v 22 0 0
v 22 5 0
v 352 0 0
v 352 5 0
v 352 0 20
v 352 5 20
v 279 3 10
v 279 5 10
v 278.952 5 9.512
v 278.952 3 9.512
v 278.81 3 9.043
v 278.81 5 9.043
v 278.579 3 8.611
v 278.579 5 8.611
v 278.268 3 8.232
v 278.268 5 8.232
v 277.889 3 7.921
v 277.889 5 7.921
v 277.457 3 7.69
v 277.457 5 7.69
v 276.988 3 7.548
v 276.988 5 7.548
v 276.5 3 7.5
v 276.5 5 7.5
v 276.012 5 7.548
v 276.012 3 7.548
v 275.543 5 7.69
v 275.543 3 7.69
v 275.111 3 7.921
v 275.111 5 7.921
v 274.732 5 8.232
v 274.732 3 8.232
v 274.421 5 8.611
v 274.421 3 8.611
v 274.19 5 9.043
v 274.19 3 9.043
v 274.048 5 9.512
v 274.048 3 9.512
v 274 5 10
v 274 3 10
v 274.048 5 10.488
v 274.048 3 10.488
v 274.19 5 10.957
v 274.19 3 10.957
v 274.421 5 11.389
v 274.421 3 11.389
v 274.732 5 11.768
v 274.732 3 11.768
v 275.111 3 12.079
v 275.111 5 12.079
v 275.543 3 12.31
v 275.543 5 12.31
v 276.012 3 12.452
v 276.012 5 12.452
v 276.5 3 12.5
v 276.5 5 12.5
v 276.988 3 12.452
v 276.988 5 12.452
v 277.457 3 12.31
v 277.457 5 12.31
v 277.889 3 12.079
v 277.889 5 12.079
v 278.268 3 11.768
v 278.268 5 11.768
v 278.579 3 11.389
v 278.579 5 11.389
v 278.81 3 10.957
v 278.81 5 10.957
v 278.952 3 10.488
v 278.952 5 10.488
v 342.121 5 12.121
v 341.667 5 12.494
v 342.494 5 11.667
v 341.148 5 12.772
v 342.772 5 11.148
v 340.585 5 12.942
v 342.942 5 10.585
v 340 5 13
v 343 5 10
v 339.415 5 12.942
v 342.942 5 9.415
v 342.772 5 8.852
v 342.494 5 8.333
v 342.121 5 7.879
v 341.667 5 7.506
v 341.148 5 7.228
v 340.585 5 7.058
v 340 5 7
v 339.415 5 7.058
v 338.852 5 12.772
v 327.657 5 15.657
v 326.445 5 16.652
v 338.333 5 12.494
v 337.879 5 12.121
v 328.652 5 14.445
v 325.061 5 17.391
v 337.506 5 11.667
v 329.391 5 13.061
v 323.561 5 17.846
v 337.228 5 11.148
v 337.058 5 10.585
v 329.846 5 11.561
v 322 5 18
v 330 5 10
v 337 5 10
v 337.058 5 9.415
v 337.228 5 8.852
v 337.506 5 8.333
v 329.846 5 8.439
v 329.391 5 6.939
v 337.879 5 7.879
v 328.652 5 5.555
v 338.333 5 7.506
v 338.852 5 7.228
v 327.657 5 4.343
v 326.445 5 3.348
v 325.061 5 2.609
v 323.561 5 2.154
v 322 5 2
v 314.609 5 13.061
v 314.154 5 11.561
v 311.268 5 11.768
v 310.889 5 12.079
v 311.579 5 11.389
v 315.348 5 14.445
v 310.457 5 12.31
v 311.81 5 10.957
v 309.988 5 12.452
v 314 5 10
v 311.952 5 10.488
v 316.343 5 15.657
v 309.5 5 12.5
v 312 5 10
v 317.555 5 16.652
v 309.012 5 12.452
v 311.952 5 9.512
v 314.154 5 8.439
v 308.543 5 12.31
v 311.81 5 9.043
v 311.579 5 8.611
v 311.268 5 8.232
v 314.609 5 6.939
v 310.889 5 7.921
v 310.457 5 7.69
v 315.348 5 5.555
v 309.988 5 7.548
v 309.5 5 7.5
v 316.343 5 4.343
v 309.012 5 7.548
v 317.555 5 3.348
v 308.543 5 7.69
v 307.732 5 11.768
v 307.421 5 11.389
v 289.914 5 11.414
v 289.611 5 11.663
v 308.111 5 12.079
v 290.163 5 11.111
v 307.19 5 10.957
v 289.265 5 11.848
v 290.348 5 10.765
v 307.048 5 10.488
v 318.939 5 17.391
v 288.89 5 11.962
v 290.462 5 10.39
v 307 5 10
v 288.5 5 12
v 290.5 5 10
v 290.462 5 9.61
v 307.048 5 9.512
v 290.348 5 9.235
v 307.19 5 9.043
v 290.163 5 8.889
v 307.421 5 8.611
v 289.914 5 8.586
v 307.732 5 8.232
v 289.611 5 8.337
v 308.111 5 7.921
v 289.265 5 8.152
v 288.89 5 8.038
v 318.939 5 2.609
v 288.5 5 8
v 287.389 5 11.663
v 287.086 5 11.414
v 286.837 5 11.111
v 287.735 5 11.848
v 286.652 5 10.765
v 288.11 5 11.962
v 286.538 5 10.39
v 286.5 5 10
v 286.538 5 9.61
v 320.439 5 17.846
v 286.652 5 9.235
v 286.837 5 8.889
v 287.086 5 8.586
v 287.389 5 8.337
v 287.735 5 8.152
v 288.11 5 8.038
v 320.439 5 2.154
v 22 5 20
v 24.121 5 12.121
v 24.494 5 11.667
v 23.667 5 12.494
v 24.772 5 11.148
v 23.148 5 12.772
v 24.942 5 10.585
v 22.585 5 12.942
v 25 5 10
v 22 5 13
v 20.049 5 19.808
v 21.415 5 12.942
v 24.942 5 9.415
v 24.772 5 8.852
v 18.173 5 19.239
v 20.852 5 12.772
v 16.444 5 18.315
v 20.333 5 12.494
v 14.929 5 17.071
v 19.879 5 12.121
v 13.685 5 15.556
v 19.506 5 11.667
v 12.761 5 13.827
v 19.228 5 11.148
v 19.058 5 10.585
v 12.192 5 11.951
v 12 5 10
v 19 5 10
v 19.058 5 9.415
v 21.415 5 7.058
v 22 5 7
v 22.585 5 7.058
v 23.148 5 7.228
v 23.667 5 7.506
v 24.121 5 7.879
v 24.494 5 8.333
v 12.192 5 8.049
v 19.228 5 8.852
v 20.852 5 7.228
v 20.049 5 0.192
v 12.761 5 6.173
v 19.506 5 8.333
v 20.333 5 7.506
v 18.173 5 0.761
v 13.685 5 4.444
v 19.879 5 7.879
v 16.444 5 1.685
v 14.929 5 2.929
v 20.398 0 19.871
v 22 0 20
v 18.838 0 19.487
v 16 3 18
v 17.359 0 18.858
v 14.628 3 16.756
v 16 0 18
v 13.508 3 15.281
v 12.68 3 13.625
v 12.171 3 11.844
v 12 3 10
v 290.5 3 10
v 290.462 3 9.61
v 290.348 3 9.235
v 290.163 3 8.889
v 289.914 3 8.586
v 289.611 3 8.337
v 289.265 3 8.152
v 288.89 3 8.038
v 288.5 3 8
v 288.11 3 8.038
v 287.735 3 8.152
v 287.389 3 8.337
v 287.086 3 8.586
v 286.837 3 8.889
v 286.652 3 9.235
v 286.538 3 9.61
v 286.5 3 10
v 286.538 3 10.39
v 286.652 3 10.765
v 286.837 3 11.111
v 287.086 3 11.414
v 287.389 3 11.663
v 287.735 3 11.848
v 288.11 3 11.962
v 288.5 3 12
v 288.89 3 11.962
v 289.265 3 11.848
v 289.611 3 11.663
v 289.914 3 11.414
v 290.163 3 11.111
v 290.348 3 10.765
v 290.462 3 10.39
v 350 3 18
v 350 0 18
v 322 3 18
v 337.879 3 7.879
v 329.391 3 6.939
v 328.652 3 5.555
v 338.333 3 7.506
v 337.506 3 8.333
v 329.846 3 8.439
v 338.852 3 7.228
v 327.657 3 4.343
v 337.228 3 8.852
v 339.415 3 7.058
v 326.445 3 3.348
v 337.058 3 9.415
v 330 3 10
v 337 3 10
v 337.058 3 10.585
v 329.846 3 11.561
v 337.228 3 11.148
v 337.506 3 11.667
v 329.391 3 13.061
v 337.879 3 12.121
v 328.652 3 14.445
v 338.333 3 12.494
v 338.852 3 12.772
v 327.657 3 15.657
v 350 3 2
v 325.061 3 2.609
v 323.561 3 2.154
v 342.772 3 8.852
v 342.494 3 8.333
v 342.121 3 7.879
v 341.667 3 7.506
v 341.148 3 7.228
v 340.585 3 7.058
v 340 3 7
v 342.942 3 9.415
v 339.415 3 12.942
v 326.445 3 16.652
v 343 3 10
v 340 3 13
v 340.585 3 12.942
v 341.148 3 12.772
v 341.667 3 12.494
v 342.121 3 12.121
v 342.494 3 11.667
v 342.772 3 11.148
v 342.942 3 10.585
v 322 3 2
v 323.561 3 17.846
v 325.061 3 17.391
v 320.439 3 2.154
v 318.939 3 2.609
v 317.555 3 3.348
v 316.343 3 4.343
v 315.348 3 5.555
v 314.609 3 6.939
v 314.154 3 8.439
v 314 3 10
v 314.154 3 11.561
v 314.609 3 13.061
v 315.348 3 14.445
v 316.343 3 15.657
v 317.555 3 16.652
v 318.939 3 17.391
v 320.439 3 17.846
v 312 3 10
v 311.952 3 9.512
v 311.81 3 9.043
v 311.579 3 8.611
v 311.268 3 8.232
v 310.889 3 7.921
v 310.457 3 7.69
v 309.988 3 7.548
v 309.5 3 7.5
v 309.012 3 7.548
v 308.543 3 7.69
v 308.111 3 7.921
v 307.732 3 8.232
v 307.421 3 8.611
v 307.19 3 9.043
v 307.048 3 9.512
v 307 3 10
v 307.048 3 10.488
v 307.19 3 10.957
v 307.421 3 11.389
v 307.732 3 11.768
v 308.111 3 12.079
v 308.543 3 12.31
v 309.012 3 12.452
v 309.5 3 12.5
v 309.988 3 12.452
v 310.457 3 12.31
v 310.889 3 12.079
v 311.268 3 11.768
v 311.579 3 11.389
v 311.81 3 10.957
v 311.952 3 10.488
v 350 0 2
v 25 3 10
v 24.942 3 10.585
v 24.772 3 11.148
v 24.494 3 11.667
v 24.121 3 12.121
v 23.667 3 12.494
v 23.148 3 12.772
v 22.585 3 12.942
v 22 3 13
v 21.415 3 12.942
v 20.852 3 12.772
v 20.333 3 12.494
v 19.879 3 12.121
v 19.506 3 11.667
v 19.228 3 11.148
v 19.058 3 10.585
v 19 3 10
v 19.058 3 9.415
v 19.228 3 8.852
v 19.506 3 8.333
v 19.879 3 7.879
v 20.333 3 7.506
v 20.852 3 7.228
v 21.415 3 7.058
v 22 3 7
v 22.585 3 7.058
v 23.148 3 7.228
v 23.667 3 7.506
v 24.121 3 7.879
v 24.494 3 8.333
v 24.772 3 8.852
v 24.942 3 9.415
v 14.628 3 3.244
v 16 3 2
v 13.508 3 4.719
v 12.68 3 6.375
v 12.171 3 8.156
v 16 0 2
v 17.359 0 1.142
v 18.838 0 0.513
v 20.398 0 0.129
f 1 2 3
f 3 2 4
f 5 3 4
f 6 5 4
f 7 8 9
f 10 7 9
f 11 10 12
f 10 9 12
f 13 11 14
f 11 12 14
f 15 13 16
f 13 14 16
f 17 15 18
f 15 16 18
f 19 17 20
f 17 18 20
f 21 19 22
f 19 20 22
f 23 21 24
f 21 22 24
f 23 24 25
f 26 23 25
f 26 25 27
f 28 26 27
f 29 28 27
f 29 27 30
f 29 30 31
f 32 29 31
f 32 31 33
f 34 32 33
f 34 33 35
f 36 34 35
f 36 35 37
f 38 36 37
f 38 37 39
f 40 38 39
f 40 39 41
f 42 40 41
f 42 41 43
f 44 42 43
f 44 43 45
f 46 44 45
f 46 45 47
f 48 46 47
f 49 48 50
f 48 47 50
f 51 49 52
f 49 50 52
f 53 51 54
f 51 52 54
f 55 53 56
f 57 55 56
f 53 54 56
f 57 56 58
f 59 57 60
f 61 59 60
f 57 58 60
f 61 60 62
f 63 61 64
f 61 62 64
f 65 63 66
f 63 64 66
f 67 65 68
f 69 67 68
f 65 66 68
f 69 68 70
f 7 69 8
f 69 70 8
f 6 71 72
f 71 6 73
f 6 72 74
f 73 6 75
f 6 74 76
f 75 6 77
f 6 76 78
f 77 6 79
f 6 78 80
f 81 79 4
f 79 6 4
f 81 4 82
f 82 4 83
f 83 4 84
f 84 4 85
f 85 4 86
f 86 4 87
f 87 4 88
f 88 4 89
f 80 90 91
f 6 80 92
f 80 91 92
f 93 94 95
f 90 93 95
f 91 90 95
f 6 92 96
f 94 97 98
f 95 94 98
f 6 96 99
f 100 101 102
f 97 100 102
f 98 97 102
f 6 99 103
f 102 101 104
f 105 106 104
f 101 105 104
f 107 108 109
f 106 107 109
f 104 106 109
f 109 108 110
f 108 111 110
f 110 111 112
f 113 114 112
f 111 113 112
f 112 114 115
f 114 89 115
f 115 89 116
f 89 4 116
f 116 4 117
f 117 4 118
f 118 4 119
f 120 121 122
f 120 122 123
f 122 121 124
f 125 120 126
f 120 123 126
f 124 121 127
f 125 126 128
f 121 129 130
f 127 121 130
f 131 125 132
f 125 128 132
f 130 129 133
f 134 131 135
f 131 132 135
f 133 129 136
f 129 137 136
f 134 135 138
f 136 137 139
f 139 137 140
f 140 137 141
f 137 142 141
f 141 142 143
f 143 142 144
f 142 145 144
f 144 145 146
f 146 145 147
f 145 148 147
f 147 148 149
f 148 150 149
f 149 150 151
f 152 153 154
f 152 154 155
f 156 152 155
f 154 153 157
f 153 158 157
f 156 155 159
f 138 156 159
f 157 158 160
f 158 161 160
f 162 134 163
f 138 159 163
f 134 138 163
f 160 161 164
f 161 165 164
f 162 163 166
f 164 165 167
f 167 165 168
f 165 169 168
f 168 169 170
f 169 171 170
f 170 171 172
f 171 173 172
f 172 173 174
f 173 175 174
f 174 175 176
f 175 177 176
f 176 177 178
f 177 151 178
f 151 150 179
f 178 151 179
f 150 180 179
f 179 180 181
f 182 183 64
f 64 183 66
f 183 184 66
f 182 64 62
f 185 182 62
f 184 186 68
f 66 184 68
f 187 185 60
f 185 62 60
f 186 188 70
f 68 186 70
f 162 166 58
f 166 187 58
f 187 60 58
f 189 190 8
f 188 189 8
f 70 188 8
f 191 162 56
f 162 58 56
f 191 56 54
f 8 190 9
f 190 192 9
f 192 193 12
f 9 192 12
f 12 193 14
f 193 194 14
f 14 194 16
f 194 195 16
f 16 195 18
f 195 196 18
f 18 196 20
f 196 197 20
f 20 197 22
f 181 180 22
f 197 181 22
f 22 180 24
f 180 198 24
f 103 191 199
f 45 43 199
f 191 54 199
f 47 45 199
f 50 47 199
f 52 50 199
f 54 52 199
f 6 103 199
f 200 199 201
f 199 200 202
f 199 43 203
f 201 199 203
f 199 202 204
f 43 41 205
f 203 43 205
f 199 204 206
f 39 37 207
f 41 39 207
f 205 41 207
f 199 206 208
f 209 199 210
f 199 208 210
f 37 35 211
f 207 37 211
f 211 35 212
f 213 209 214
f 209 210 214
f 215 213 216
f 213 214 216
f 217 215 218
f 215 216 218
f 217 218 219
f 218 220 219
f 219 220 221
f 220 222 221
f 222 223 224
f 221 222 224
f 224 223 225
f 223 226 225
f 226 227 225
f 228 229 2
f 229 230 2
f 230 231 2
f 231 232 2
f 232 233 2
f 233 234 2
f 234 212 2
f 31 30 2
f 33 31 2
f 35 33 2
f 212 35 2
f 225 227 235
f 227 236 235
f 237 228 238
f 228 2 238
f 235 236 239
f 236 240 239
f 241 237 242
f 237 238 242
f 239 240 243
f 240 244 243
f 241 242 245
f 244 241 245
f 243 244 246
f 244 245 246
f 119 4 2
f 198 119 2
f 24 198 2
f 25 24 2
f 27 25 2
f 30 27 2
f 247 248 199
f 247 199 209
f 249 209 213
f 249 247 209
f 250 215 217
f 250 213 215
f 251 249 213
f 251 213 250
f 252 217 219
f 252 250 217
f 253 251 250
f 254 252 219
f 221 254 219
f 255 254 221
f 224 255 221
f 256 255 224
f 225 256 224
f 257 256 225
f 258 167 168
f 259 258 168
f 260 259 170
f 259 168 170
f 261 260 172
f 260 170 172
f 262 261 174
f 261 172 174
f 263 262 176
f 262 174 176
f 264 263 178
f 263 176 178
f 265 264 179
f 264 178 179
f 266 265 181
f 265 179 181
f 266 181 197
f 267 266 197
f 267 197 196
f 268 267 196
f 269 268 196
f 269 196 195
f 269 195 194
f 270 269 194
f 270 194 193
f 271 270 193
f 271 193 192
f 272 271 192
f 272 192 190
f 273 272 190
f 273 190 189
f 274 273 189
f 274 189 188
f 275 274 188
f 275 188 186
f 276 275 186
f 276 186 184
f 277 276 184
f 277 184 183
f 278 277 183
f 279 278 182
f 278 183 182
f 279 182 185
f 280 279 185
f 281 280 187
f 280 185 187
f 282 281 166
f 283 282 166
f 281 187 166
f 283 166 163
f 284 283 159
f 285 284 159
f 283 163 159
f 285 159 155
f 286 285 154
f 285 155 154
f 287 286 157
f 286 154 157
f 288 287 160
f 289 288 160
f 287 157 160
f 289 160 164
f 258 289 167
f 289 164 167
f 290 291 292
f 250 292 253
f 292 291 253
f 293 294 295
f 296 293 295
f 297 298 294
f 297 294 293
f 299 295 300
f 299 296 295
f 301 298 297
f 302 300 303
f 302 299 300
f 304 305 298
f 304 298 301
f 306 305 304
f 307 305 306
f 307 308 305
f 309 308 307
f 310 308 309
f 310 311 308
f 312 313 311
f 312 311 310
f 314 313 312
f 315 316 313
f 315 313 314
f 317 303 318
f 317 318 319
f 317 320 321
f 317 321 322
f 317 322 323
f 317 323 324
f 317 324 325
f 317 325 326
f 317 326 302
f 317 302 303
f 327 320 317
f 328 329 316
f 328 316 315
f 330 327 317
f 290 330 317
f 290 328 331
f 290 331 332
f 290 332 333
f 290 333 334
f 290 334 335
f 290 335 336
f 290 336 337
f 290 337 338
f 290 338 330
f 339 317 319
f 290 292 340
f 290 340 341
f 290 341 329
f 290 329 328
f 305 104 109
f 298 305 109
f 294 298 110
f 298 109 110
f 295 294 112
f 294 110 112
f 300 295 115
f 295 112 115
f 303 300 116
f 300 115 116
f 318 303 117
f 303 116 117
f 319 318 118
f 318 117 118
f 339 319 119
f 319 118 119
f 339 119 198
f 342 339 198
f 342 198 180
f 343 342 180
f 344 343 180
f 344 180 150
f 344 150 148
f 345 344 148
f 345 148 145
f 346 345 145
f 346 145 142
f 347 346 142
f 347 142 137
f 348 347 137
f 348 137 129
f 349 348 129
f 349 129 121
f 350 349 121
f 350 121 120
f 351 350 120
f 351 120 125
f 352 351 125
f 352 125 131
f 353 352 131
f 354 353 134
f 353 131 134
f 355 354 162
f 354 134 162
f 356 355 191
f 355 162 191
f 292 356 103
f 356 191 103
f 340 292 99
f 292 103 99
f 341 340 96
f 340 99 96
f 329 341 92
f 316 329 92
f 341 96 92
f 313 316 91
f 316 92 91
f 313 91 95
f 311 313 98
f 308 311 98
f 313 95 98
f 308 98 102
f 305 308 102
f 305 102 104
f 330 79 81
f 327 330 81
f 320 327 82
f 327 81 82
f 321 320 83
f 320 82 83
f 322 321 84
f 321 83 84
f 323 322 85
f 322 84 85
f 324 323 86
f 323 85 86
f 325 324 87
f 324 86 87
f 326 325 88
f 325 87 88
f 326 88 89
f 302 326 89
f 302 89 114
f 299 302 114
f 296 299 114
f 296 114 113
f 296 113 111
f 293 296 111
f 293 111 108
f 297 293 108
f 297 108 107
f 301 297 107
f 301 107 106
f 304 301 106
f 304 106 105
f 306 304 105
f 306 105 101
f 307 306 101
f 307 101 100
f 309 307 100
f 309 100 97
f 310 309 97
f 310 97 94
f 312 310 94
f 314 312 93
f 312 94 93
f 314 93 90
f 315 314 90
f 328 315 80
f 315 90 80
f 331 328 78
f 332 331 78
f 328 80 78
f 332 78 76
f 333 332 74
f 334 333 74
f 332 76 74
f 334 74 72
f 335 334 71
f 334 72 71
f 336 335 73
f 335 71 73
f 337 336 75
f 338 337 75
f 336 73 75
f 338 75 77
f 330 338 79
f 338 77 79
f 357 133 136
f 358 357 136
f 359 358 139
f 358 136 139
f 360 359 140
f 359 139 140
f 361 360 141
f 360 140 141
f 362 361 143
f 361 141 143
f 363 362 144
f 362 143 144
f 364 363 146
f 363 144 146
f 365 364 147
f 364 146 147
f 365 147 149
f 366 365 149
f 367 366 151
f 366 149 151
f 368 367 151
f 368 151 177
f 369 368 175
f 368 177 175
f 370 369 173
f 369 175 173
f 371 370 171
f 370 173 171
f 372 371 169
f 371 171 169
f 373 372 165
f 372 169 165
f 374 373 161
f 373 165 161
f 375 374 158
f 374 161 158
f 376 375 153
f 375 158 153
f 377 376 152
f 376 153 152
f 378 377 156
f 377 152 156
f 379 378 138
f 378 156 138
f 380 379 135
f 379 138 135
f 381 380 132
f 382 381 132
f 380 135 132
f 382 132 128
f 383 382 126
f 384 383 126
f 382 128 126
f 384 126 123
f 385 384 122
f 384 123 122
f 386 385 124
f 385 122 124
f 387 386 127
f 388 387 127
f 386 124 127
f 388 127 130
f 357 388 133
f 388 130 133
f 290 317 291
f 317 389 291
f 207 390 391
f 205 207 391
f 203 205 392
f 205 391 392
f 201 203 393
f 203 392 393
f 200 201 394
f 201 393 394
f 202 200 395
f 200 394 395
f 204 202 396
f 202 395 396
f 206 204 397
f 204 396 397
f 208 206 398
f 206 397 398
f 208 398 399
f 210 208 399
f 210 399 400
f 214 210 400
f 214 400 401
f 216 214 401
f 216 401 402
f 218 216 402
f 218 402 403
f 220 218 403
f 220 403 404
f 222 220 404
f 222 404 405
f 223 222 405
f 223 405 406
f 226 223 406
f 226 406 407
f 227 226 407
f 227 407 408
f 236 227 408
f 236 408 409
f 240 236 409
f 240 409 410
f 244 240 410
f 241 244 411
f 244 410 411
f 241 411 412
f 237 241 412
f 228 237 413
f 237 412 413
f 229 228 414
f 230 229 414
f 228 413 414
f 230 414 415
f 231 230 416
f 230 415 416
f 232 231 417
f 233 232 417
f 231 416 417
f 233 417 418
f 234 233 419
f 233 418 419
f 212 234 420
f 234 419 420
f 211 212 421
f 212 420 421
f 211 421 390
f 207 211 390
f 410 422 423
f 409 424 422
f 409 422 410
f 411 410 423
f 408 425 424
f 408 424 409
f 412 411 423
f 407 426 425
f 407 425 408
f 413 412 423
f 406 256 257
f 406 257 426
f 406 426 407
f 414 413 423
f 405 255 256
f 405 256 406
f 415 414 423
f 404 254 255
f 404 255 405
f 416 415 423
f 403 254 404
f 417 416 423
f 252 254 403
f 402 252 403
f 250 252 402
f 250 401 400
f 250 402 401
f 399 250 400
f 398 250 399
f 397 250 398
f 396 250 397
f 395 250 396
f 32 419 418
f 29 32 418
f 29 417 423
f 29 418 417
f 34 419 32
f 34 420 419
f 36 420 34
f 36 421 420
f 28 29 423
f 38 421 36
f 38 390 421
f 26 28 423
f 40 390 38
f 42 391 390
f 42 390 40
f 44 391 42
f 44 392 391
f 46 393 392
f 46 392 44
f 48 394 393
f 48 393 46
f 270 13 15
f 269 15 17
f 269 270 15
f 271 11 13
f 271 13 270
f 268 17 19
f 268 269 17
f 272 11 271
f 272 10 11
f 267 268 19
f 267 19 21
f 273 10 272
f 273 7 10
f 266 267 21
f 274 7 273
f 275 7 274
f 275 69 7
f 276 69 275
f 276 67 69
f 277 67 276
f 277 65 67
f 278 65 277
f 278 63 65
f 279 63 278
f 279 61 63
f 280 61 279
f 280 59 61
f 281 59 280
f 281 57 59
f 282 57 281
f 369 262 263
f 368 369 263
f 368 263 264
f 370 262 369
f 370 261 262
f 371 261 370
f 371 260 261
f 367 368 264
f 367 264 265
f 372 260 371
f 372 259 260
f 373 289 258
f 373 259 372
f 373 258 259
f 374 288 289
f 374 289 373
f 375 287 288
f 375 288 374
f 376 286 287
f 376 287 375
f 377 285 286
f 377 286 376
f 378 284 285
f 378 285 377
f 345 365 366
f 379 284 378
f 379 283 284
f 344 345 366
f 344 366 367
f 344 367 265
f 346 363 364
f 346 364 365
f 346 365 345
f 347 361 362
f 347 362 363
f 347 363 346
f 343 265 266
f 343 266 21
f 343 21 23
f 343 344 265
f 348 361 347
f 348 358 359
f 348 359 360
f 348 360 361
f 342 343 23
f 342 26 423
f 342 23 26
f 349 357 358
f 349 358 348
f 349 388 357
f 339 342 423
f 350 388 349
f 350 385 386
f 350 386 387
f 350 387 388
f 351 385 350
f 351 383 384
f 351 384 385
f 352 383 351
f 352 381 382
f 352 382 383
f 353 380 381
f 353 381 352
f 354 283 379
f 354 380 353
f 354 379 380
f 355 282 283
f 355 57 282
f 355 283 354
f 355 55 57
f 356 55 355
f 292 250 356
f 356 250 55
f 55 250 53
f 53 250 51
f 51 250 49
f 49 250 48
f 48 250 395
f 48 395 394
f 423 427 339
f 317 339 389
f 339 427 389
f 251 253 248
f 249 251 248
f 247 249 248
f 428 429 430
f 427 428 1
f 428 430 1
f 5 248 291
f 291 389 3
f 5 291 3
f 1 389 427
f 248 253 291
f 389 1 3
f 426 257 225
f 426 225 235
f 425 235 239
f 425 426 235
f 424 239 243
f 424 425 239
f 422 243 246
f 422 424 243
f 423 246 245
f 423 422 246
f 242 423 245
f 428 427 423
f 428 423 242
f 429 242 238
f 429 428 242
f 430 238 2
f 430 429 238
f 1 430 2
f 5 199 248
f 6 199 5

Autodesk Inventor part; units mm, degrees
ref_plane "YZ Plane" through (0, 0, 0) normal (1, 0, 0) x (0, 1, 0)
ref_plane "XZ Plane" through (0, 0, 0) normal (0, 1, 0) x (-1, 0, 0)
ref_plane "XY Plane" through (0, 0, 0) normal (0, 0, 1) x (1, 0, 0)
sketch "スケッチ1" plane through (0, 0, 0) normal (0, 0, 1) x (1, 0, 0)
  line L0 (0, 0) -> (352, 0)
  line L1 (352, 0) -> (352, 5)
  line L2 (352, 5) -> (0, 5)
  line L3 (0, 5) -> (0, 0)
  line L4 (0, 0) -> (6, 0)
  line L5 (0, 1) -> (0, 0)
  dimension "d0" = 352
  dimension "d1" = 5
extrude "押し出し1" add sketch "スケッチ1" along normal blind 20
sketch "スケッチ3" plane through (0, 0, 0) normal (-1, 0, 0) x (0, 0, 1)
  line L0 (0, 5) -> (0, 0) projected
  line L1 (0, 0) -> (20, 0) projected
  line L2 (20, 5) -> (20, 0) projected
  line L3 (0, 5) -> (20, 5) projected
  circle A0 centre (4, 2) radius 1.2
  circle A1 centre (16, 3) radius 1.2
  dimension "d14" = 2.4
  dimension "d15" = 2.4
  dimension "d16" = 3
  dimension "d17" = 4
  dimension "d18" = 4
  dimension "d19" = 3
extrude "押し出し3" cut sketch "スケッチ3" against normal blind 6 contours A0 | A1
sketch "スケッチ4" plane through (0, 0, 0) normal (0, -1, 0) x (1, 0, 0)
  line L0 (0, 0) -> (352, 0) projected
  line L1 (352, 0) -> (352, 20) projected
  line L2 (0, 20) -> (352, 20) projected
  line L3 (0, 0) -> (0, 20) projected
  line L4 (2, 2) -> (350, 2)
  line L5 (350, 2) -> (350, 18)
  line L6 (350, 18) -> (2, 18)
  line L7 (2, 18) -> (2, 2)
  dimension "d22" = 2
  dimension "d23" = 2
  dimension "d24" = 2
  dimension "d25" = 2
extrude "押し出し4" cut sketch "スケッチ4" against normal blind 3 contours L7 L6 L5 L4
sketch "スケッチ5" plane through (0, 5, 0) normal (0, 1, 0) x (1, 0, 0)
  circle A0 centre (322, -10) radius 8 projected
extrude "押し出し5" cut sketch "スケッチ5" against normal through all
sketch "スケッチ6" plane through (0, 5, 0) normal (0, 1, 0) x (1, 0, 0)
  circle A0 centre (340, -10) radius 3 projected
extrude "押し出し6" cut sketch "スケッチ6" against normal through all
sketch "スケッチ7" plane through (0, 5, 0) normal (0, 1, 0) x (1, 0, 0)
  circle A0 centre (309.5, -10) radius 2.5 projected
  circle A1 centre (288.5, -10) radius 2 projected
  circle A2 centre (276.5, -10) radius 2.5 projected
extrude "押し出し7" cut sketch "スケッチ7" against normal through all
sketch "スケッチ8" plane through (0, 0, 20) normal (0, 0, 1) x (1, 0, 0)
  line L0 (352, 5) -> (0, 5) projected
  line L1 (0, 5) -> (0, 0) projected
  line L2 (0, 0) -> (352, 0) projected
  line L3 (350, 0) -> (2, 0) projected
  line L4 (0, 5) -> (12, 5)
  line L5 (12, 5) -> (12, 0)
  line L6 (12, 0) -> (0, 0)
  line L7 (0, 0) -> (0, 5)
  dimension "d34" = 12
extrude "押し出し8" cut sketch "スケッチ8" against normal through all
sketch "スケッチ9" plane through (0, 3, 0) normal (0, -1, 0) x (1, 0, 0)
  line L0 (12, 0) -> (12, 20) projected
  line L1 (12, 10) -> (22, 10)
  circle A0 centre (22, 10) radius 3
  point P0 (0, 0)
  dimension "d37" = 10
  dimension "d38" = 6
extrude "押し出し9" cut sketch "スケッチ9" against normal through all
fillet "フィレット1" radius 10 2 edges at (12, 2.5, 20) (12, 2.5, 0)
properties part number "arm1_L"
